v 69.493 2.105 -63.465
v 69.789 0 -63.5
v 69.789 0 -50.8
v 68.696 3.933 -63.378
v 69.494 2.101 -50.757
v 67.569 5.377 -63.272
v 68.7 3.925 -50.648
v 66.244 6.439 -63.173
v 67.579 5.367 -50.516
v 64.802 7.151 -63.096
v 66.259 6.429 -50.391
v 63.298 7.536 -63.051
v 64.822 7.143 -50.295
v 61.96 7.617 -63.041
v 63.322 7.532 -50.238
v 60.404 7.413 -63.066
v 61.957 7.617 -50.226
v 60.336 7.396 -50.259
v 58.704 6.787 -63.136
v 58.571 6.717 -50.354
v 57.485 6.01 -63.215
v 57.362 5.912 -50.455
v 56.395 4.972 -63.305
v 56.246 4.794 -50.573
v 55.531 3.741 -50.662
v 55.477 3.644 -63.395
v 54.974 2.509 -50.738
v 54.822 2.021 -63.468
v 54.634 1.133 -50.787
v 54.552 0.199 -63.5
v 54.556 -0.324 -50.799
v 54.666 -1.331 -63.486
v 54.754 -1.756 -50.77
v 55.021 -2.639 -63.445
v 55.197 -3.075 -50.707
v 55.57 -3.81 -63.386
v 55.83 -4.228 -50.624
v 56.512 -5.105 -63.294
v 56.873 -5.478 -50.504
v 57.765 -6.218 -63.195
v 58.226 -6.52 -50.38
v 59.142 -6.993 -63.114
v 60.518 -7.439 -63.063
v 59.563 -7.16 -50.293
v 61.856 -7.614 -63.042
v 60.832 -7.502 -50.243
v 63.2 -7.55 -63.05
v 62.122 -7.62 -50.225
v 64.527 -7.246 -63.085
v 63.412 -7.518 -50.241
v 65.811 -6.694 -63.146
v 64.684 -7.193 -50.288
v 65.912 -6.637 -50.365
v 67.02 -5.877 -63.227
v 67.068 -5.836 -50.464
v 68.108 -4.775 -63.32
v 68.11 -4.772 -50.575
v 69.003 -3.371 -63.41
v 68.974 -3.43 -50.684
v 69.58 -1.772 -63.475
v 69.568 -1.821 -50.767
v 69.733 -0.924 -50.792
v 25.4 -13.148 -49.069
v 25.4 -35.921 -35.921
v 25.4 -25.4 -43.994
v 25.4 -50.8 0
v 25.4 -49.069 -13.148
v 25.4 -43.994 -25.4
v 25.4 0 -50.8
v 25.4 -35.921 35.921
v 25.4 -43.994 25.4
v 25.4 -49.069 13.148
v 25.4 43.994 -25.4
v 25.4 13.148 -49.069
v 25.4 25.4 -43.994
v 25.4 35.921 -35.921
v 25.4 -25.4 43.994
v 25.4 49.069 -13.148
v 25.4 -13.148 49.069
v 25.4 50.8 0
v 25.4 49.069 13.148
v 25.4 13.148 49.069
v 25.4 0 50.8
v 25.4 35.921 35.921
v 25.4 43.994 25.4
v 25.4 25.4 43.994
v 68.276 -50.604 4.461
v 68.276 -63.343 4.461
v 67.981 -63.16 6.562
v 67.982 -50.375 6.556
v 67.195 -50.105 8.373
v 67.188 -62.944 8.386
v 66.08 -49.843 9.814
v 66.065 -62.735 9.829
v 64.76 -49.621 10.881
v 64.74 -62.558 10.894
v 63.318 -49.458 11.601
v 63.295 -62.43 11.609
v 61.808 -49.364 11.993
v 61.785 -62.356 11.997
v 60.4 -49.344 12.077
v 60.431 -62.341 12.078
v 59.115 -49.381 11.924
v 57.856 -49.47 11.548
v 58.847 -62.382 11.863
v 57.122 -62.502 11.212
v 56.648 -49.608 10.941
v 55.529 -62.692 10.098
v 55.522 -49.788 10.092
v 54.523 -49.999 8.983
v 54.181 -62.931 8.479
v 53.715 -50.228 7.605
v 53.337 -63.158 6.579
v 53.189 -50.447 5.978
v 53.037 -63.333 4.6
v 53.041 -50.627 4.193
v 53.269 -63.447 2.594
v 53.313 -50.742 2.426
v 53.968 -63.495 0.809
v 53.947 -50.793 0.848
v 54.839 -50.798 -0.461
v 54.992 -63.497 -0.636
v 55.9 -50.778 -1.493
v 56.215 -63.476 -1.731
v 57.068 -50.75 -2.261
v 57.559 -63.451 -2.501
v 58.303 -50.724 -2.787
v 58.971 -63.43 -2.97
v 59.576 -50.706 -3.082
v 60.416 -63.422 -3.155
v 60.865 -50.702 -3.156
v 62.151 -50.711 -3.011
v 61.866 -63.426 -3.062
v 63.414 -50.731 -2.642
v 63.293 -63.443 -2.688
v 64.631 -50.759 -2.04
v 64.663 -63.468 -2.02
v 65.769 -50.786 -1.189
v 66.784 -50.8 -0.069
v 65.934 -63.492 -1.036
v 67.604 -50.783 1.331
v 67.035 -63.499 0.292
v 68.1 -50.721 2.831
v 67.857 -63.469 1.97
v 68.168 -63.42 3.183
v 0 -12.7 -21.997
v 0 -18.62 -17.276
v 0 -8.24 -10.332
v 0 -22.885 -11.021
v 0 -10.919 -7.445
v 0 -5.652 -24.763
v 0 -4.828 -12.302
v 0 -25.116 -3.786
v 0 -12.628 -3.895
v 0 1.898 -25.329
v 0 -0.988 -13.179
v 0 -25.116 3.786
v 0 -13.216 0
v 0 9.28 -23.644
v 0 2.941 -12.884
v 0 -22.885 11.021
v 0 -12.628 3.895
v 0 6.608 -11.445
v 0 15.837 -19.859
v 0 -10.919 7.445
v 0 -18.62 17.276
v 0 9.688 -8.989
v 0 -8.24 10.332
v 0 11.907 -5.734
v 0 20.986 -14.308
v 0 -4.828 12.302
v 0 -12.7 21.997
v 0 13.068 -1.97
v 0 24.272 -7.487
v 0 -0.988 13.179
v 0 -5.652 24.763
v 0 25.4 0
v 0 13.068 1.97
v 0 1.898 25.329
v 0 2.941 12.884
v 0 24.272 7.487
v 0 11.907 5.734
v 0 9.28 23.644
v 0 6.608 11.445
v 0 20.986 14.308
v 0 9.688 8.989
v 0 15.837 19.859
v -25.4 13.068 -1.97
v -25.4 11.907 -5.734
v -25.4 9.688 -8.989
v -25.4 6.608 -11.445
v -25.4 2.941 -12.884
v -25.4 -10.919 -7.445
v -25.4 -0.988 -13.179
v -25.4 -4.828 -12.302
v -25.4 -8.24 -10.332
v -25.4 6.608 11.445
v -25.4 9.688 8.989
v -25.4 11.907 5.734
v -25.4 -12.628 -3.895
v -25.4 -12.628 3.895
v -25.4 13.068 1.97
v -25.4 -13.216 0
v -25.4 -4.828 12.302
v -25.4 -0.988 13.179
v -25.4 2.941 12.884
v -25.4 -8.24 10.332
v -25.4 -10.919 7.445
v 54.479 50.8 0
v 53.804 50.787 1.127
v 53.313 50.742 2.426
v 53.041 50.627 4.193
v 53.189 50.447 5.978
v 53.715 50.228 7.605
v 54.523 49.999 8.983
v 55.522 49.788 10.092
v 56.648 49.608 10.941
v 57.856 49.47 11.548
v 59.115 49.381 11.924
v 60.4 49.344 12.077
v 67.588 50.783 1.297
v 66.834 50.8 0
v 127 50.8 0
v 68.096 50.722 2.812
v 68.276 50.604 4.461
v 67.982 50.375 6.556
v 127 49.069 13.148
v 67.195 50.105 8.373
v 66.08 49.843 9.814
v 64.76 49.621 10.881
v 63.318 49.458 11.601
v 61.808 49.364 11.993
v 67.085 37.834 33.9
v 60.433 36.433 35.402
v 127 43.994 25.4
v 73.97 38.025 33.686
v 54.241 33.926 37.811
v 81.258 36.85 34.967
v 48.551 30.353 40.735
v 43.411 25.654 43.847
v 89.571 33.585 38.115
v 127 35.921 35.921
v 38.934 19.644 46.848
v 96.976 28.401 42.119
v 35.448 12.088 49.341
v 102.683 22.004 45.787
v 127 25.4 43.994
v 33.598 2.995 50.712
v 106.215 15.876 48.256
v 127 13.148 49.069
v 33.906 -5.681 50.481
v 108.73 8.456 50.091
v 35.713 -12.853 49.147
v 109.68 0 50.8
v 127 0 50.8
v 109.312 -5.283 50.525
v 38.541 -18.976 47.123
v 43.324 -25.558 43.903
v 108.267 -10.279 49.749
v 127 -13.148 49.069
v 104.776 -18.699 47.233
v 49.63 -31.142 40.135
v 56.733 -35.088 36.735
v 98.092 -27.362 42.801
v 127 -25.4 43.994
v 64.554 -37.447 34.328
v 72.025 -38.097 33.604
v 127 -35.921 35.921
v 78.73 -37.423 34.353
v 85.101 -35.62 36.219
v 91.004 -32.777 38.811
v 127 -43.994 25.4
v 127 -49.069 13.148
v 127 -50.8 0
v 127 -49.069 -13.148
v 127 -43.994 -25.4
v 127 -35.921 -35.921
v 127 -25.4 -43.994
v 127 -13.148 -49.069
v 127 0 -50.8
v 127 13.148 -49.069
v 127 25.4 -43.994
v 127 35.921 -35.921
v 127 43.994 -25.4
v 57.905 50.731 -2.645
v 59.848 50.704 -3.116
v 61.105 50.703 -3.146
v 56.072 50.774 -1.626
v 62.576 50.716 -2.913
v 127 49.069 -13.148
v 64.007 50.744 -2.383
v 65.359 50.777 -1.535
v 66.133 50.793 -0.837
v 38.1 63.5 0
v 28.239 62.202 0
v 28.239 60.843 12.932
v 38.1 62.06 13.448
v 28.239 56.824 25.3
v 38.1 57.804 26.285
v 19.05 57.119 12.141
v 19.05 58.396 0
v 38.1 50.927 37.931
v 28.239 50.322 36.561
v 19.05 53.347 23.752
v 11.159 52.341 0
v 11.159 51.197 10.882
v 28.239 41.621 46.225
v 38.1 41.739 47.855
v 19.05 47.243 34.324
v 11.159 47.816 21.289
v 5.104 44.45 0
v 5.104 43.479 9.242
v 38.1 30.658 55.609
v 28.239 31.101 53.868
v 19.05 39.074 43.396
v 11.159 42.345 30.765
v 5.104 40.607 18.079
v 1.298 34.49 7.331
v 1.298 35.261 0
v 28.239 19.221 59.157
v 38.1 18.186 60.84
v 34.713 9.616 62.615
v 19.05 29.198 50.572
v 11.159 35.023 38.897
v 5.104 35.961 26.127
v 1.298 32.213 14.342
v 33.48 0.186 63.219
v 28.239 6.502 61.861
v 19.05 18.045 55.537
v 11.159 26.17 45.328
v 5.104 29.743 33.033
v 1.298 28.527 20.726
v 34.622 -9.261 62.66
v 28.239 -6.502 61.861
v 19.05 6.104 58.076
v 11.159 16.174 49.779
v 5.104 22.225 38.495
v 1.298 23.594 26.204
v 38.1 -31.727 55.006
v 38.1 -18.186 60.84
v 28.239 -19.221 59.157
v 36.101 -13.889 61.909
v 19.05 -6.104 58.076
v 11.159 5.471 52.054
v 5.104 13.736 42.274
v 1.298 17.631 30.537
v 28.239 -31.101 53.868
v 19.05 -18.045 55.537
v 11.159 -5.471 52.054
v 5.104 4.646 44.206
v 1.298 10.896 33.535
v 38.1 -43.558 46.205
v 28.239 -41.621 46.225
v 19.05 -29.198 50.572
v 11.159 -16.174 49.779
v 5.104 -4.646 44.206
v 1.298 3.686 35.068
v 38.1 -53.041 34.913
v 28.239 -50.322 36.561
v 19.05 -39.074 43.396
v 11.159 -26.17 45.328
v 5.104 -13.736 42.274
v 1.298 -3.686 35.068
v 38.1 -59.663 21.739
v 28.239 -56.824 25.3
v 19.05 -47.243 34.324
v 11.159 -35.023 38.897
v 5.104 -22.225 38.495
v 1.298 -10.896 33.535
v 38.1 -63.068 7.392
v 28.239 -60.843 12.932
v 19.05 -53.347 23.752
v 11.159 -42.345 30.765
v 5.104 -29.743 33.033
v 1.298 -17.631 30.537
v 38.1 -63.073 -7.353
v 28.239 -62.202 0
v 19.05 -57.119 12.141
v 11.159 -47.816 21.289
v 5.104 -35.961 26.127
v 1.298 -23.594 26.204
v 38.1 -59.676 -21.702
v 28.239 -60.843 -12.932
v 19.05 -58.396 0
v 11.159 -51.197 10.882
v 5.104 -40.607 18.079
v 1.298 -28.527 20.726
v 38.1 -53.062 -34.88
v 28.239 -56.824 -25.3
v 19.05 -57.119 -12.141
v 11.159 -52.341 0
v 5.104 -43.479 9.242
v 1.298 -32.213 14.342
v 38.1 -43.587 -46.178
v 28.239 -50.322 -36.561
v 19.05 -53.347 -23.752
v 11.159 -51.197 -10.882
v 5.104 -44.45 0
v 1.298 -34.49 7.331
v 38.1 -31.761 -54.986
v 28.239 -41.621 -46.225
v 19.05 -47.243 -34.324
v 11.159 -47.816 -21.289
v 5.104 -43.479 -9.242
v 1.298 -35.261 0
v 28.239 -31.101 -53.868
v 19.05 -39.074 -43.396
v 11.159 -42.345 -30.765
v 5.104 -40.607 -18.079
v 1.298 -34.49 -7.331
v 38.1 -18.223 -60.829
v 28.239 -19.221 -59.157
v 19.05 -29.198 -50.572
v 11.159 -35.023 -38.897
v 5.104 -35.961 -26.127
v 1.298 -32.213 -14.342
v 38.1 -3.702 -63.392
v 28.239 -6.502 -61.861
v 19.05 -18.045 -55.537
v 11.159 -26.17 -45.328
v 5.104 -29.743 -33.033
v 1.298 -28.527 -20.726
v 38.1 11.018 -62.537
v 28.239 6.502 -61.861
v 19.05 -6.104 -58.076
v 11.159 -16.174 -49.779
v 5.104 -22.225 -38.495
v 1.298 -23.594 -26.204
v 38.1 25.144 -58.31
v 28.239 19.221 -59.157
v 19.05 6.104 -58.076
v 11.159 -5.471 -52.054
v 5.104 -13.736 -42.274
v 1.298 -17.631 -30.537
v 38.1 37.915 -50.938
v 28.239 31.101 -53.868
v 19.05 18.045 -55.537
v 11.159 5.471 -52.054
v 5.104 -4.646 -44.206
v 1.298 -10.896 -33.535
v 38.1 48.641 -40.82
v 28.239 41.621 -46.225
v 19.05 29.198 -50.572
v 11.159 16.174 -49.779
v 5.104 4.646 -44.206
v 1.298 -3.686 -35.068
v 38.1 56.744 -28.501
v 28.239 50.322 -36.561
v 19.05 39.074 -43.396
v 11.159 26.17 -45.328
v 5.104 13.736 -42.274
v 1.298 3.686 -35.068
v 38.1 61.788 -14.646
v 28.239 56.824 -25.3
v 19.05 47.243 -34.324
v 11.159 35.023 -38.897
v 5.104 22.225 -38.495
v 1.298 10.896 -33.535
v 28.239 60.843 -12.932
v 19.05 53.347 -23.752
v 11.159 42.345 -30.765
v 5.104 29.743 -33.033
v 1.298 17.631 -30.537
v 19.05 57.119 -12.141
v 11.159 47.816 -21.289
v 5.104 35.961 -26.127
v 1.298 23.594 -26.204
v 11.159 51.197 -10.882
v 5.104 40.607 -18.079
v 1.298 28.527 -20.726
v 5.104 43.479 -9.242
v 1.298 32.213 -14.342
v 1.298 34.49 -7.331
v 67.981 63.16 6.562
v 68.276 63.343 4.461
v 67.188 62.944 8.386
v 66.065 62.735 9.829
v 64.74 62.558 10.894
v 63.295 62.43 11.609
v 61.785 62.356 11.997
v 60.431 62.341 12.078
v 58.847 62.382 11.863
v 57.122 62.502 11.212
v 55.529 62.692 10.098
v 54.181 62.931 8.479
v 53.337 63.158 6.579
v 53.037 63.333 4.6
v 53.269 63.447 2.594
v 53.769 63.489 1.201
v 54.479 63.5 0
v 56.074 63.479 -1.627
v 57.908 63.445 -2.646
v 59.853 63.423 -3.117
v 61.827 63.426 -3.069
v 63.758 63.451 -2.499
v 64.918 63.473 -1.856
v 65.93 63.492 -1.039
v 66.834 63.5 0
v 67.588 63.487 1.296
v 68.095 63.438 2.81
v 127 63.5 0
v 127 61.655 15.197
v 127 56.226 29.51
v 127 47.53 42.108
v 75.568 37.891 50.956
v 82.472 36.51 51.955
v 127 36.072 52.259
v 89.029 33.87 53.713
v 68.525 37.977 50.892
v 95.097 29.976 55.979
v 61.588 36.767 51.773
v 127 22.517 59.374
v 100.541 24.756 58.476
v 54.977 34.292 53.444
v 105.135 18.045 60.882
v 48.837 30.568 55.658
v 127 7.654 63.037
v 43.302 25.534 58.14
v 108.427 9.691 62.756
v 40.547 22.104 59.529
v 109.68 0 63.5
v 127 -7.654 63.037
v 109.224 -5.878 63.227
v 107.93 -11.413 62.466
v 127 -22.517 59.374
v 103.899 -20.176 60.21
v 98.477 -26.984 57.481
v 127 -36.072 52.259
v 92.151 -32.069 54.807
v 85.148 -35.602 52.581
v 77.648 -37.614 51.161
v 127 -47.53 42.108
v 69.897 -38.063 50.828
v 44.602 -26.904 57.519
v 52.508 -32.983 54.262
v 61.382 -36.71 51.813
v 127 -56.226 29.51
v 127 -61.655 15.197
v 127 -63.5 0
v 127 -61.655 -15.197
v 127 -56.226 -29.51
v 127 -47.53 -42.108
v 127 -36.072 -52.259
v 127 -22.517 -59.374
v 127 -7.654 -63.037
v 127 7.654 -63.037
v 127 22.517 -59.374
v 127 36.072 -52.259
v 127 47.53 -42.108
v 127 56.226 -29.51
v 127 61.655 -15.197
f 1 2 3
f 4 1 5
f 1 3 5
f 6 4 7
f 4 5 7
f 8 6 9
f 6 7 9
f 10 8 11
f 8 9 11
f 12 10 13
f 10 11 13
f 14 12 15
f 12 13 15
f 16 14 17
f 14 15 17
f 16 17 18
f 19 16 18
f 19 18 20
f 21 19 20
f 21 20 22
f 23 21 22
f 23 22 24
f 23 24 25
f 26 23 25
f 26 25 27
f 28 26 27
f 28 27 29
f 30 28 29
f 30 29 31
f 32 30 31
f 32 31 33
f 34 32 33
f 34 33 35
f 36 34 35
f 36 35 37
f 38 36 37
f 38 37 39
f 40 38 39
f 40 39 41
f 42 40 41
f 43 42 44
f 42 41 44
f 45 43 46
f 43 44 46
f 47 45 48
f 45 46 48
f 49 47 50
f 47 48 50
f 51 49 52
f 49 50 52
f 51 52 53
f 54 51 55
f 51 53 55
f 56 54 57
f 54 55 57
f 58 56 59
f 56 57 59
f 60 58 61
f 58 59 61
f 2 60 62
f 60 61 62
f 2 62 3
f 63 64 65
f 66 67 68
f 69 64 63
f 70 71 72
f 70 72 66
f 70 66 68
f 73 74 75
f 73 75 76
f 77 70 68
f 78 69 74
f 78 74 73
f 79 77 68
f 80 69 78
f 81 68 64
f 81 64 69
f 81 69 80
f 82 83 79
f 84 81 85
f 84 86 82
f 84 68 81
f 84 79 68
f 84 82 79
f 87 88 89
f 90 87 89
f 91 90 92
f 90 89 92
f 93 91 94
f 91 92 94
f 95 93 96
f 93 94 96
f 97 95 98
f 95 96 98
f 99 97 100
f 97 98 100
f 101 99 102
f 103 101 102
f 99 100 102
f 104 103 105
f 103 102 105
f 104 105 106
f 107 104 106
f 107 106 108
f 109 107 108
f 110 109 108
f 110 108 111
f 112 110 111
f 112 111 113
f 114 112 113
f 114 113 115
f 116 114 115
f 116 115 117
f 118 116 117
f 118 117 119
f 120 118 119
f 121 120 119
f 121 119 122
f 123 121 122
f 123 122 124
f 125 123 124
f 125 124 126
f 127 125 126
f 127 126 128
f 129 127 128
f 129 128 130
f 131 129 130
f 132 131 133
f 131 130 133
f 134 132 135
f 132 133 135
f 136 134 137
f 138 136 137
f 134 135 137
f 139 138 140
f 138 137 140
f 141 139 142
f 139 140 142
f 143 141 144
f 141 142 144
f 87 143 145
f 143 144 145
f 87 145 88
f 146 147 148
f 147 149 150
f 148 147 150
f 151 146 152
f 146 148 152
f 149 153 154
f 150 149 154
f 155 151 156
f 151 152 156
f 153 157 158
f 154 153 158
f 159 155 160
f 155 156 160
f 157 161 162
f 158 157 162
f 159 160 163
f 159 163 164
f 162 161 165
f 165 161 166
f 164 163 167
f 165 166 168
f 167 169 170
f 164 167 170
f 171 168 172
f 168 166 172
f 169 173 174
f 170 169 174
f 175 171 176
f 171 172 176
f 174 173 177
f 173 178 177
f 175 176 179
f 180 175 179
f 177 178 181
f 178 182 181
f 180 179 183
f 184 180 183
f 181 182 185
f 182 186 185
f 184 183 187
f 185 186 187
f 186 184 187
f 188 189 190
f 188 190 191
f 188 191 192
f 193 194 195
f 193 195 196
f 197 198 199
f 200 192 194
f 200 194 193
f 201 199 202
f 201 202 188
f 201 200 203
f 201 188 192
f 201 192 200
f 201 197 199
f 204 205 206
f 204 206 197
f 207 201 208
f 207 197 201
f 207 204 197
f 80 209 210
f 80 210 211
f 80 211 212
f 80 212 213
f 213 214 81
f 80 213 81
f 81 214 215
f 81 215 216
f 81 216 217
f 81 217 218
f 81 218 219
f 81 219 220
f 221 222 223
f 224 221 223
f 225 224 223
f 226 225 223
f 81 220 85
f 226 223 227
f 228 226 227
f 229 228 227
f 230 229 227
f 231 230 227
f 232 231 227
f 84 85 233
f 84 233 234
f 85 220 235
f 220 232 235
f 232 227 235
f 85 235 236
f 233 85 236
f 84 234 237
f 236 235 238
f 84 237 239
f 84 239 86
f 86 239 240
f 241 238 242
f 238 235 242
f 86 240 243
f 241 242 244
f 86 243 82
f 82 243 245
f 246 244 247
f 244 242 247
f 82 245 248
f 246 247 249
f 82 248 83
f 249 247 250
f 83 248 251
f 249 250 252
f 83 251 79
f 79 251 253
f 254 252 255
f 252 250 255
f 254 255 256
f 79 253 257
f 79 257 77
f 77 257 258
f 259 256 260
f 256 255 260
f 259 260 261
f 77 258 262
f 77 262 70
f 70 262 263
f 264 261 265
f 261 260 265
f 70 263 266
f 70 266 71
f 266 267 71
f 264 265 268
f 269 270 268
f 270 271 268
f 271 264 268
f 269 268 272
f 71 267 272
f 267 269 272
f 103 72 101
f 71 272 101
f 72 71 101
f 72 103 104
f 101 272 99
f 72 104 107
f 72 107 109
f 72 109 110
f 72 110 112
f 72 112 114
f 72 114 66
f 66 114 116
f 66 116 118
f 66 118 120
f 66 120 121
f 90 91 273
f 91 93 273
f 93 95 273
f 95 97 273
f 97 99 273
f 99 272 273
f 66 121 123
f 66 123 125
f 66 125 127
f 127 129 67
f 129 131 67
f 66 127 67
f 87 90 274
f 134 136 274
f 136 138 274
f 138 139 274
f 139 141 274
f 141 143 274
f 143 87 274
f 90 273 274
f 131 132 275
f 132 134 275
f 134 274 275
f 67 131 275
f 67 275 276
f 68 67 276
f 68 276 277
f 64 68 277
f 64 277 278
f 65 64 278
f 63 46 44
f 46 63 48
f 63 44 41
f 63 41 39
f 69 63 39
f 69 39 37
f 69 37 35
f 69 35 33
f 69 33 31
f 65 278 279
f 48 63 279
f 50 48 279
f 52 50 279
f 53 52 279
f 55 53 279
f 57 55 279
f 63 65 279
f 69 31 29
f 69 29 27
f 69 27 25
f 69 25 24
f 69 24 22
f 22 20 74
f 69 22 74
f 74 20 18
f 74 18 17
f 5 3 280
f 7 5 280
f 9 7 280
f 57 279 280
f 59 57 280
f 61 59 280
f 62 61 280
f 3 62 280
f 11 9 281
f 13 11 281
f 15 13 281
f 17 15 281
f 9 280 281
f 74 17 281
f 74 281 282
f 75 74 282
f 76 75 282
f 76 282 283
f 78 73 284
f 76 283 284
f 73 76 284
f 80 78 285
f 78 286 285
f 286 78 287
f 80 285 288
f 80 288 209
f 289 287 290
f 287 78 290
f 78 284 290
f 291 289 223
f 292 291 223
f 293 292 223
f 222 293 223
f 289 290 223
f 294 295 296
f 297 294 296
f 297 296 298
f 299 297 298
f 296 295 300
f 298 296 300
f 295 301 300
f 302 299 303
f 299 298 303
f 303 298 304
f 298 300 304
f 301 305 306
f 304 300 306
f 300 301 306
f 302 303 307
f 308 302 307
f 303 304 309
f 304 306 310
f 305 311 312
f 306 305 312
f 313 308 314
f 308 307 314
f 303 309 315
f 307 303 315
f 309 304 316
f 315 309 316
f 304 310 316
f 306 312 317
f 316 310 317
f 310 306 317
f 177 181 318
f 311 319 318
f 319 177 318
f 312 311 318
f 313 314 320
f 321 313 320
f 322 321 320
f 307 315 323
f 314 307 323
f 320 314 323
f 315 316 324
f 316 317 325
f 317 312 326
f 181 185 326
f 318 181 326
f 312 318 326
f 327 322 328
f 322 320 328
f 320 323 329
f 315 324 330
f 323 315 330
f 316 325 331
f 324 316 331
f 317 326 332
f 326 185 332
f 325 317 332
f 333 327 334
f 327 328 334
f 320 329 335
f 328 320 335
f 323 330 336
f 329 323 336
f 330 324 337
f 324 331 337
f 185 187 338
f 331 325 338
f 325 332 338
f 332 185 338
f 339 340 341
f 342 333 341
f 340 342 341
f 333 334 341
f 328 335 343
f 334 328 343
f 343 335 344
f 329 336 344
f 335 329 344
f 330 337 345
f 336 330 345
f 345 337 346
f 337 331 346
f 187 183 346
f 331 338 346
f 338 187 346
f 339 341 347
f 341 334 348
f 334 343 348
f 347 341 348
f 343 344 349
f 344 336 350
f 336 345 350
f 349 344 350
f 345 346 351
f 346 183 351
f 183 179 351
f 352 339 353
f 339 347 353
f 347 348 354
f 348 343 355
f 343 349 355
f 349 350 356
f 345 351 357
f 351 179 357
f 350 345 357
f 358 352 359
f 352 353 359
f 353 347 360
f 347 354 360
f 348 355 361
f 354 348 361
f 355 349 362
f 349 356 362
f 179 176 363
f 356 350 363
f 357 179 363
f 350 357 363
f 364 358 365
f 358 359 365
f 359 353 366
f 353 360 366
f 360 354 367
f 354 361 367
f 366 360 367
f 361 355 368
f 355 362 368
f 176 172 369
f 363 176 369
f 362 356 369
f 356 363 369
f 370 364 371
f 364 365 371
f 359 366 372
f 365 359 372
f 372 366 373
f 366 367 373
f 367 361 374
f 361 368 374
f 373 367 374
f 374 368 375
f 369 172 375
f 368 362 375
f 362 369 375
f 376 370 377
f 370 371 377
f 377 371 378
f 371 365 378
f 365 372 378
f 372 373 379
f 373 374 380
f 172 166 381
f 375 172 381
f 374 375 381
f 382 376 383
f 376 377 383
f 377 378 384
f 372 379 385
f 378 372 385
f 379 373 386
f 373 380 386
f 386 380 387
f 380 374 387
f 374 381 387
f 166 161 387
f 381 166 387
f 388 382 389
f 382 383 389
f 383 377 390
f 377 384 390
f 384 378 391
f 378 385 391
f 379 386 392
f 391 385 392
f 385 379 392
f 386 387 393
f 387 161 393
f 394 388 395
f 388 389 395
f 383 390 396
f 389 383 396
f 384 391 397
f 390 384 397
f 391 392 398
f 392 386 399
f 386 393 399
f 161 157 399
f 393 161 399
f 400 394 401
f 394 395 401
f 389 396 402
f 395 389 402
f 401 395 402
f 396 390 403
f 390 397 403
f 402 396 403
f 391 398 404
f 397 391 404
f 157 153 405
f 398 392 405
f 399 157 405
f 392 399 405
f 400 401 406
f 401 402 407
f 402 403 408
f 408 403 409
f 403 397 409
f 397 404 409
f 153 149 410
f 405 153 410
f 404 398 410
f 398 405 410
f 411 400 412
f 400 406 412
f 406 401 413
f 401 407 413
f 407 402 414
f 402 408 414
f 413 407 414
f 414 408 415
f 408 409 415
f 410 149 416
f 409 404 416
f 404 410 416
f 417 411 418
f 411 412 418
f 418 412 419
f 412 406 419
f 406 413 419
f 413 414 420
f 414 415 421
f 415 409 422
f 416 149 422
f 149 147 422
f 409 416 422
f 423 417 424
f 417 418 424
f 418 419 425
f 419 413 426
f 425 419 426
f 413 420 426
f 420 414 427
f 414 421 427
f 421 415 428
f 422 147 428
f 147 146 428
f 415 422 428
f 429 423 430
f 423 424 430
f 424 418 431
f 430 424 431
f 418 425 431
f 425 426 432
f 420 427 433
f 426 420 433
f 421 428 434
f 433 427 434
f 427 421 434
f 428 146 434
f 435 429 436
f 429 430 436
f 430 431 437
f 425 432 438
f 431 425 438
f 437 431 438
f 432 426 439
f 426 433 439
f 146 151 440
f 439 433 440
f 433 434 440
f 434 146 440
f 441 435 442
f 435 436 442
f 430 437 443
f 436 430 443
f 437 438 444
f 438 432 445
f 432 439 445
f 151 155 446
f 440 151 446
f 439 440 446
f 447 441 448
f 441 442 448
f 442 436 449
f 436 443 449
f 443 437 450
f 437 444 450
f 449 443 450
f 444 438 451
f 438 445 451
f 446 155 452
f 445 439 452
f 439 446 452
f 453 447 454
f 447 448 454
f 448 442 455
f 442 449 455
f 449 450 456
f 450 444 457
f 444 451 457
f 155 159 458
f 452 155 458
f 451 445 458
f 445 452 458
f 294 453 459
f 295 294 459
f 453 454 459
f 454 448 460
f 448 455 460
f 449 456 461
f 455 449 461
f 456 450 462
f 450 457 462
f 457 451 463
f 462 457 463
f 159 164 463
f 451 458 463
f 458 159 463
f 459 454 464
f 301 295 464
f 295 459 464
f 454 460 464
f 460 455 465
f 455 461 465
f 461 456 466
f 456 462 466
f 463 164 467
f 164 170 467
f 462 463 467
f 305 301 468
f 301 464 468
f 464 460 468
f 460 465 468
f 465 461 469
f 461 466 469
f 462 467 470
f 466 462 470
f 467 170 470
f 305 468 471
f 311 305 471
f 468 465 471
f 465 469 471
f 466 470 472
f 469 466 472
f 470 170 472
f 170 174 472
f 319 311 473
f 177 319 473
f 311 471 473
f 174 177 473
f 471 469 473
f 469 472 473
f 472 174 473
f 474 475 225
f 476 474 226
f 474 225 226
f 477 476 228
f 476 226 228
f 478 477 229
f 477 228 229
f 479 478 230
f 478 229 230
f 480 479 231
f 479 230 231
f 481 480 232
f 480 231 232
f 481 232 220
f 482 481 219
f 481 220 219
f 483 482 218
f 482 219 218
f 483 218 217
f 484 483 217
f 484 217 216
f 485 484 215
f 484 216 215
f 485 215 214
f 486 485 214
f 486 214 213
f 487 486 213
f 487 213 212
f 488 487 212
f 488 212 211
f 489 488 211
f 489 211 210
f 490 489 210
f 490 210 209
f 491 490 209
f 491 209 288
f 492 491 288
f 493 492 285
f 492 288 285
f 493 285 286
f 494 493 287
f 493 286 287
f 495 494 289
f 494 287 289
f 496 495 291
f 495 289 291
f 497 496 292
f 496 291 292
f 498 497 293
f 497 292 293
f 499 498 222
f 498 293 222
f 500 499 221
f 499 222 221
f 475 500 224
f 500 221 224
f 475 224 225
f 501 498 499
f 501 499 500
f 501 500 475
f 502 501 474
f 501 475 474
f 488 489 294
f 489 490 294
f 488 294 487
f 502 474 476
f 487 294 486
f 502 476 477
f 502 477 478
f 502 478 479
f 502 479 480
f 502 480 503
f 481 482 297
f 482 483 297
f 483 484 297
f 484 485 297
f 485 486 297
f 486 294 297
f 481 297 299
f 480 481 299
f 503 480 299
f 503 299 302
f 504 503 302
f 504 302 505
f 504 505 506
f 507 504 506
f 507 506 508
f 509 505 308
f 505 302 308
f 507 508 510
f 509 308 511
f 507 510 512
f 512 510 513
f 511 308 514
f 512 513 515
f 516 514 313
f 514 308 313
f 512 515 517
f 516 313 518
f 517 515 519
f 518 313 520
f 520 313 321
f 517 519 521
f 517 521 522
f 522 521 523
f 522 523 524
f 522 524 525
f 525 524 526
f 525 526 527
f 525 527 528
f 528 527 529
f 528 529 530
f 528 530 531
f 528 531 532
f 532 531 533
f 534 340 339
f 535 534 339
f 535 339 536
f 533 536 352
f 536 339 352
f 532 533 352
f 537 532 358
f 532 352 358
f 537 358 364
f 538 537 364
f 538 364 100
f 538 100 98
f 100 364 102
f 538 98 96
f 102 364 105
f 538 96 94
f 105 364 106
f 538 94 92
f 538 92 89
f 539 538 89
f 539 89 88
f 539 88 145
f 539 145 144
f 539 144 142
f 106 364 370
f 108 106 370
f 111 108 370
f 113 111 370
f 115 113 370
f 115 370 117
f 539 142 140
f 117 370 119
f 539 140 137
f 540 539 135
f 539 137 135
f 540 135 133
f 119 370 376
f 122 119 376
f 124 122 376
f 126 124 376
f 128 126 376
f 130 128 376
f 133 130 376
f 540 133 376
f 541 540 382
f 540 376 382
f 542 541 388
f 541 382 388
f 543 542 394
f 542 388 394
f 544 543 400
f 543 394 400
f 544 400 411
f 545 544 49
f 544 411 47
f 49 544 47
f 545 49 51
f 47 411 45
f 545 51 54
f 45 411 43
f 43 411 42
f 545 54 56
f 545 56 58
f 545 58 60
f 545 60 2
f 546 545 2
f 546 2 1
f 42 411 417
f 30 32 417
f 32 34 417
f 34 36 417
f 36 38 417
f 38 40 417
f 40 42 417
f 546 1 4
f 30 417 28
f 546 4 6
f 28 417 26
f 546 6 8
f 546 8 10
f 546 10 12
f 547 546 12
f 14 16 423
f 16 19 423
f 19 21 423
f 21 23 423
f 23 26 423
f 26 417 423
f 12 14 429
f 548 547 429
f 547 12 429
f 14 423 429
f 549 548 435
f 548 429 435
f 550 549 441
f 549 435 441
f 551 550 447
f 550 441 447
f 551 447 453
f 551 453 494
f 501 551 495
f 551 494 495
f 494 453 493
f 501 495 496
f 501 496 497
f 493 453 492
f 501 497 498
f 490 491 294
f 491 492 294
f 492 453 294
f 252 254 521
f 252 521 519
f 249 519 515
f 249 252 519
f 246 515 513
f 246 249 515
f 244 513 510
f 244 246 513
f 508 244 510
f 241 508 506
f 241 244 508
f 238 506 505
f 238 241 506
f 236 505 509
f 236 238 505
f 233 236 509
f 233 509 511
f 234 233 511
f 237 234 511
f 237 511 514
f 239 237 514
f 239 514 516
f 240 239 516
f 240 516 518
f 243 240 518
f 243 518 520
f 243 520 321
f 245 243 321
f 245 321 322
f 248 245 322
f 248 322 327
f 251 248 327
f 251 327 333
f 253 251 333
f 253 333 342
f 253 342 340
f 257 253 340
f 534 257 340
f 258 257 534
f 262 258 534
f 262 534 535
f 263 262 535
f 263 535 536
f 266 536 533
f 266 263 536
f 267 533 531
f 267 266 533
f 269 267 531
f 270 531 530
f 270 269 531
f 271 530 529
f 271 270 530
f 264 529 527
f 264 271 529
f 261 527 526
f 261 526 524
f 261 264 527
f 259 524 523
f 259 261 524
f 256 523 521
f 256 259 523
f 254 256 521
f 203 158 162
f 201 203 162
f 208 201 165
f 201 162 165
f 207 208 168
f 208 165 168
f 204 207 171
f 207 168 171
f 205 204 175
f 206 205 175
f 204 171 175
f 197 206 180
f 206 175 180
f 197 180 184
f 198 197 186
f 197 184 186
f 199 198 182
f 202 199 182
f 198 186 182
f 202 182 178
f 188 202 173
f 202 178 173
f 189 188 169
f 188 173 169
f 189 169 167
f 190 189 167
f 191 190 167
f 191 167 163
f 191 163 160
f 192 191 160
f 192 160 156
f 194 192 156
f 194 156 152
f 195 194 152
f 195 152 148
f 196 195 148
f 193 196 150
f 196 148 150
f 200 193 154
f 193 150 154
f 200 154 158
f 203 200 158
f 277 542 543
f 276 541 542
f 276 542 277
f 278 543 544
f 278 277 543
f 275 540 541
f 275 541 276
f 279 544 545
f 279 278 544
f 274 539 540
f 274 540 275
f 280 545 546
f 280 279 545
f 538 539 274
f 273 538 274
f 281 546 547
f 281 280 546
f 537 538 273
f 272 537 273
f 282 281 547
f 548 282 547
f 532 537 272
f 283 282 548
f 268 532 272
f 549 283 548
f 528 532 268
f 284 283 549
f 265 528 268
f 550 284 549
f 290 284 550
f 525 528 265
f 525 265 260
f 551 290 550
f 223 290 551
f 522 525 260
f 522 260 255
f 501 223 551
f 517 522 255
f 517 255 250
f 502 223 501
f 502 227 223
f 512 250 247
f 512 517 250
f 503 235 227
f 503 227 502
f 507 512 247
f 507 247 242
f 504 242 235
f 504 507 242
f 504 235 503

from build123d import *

# Parameters (mm, degrees)
F0_R      = 63.5
F1_DEPTH  = 127
F2_R      = 50.8
F3_DEPTH  = 101.6
F4_R      = 38.1
F6_R      = 7.62
F7_DEPTH  = 152.4
F8_R      = 7.62
F9_DEPTH  = 381
F10_R     = 38.1
F11_DEPTH = 381
F12_R     = 13.215582
F13_DEPTH = 25.4


with BuildPart() as f1:
    # F0 (on Right) → F1 (new body)
    with BuildSketch(Plane.YZ):
        Circle(F0_R)
    extrude(amount=F1_DEPTH)

    # F2 (on face) → F3 (cut)
    with BuildSketch(Plane.YZ.offset(127)):
        Circle(F2_R)
    extrude(amount=-F3_DEPTH, mode=Mode.SUBTRACT)

    # F4
    f4_edges = [f1.edges().sort_by_distance(p)[0] for p in [
        (0, -63.5, 0),
    ]]
    fillet(f4_edges, radius=F4_R)

    # F6 (on offset) → F7 (cut)
    with BuildSketch(Plane.XZ.offset(76.2)):
        with Locations((60.656205, 4.460988)):
            Circle(F6_R)
    extrude(amount=-F7_DEPTH, mode=Mode.SUBTRACT)

    # F8 (on Top) → F9 (cut)
    with BuildSketch(Plane.XY):
        with Locations((62.16915, 0)):
            Circle(F8_R)
    extrude(amount=-F9_DEPTH, mode=Mode.SUBTRACT)

    # F10 (on Top) → F11 (cut)
    with BuildSketch(Plane.XY):
        with Locations((71.579769, 0)):
            Circle(F10_R)
    extrude(amount=F11_DEPTH, mode=Mode.SUBTRACT)

    # F12 (on face) → F13 (join)
    with BuildSketch(Plane(origin=(0, 0, 0), x_dir=(0, -1, 0), z_dir=(-1, 0, 0))):
        Circle(F12_R)
    extrude(amount=F13_DEPTH)


solid = f1.part
